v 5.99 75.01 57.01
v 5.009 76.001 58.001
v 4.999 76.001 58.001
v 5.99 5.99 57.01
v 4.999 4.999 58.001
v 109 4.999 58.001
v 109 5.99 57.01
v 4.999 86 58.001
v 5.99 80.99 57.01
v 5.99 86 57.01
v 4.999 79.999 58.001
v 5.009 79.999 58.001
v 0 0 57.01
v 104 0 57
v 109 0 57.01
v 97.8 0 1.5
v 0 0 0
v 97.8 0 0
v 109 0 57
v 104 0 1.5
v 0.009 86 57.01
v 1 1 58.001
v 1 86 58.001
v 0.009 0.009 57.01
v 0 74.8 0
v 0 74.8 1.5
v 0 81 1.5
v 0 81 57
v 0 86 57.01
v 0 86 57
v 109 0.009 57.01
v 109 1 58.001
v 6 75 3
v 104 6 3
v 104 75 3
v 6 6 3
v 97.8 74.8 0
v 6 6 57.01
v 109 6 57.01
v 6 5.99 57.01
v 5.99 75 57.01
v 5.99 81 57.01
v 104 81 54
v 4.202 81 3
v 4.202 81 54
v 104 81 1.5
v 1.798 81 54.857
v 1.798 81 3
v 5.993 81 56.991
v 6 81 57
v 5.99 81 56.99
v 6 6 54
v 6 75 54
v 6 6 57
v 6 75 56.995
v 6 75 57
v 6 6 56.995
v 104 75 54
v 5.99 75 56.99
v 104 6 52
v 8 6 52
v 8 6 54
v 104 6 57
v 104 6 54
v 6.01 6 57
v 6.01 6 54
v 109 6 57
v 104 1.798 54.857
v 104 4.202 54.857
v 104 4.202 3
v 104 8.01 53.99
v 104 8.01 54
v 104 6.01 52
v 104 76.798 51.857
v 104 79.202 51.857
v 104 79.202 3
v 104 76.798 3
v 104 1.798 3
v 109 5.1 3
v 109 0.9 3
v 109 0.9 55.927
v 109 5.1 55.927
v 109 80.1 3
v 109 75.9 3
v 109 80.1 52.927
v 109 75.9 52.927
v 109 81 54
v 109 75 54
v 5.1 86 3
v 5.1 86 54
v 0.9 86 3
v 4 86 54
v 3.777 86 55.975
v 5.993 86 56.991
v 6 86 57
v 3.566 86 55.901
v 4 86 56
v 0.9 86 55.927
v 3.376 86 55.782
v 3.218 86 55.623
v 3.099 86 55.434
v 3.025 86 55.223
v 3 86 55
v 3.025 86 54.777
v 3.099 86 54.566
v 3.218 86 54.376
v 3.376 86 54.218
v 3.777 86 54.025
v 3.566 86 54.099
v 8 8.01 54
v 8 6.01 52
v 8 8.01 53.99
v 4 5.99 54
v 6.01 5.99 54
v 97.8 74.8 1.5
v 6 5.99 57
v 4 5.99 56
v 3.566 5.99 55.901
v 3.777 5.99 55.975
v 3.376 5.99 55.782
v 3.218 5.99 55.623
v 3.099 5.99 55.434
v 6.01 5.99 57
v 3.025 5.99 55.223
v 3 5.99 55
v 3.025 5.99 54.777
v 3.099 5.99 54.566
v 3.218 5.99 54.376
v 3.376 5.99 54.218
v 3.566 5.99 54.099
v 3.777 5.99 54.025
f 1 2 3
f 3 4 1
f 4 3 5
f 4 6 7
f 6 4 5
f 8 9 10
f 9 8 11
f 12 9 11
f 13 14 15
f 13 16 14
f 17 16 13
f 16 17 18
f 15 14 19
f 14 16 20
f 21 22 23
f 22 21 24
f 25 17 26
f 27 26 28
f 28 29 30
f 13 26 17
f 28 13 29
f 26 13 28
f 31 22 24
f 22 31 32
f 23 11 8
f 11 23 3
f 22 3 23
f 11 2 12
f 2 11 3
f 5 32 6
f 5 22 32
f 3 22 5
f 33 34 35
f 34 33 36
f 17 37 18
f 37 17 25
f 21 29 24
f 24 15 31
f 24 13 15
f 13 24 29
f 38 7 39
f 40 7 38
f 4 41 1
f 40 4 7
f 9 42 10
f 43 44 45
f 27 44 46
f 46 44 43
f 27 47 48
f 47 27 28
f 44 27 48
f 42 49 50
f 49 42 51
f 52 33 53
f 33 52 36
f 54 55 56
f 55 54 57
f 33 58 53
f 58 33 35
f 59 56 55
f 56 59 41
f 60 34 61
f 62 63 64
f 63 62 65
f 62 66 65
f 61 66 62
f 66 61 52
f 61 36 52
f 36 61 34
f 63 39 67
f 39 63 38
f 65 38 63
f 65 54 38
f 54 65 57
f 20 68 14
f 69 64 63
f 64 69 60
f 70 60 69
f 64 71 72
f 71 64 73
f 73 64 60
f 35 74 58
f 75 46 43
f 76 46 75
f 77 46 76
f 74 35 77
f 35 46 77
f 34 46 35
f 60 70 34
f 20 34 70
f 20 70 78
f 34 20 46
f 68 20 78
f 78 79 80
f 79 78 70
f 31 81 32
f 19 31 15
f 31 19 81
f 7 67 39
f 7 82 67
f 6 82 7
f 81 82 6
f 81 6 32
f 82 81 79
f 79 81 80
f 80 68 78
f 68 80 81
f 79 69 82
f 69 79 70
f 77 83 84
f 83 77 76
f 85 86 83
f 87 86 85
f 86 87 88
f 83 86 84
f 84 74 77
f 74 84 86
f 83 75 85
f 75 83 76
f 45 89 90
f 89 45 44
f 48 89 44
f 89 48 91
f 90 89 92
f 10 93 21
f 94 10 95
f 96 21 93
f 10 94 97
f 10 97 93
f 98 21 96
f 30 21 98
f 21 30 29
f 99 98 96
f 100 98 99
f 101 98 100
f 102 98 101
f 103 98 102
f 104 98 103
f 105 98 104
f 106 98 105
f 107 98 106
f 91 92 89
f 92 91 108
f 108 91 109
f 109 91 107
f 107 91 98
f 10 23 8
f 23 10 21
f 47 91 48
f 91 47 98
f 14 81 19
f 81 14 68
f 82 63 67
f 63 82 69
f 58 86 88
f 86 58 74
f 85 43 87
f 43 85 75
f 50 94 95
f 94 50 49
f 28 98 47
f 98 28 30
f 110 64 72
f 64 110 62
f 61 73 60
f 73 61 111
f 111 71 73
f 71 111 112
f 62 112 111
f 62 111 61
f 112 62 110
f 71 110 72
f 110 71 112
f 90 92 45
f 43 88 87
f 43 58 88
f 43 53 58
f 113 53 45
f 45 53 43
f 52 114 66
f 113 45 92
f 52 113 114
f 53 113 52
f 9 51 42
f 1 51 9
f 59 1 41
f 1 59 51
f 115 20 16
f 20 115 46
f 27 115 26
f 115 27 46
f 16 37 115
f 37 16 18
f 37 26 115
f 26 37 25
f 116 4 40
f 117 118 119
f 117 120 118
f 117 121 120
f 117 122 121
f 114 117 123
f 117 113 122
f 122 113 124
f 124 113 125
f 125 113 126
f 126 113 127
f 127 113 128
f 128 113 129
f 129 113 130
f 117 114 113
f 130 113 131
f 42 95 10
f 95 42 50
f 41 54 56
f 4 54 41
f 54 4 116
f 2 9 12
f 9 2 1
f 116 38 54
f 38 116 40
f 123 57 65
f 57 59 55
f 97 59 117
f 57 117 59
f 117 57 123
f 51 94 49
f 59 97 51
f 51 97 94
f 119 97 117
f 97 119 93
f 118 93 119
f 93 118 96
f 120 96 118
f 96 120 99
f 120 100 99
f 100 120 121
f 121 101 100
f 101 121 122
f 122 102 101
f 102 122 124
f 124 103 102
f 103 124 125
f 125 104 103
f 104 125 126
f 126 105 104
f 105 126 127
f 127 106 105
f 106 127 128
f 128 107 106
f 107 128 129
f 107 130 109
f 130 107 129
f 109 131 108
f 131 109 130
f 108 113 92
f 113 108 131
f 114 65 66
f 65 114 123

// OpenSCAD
// ============================================================================
// cutlery_box.scad
// Graduated 3-chamber disposable-cutlery box (Option 3) — CUT-FROM-SOLID port
// of build_box.py, for a 120 x 120 x 120 mm printer (AOSEED).
//
// WHY THIS PORT EXISTS (the whole point):
//   The hand-mesh generator (build_box.py) could not keep the 1 mm rim chamfer
//   continuous across the female dovetail joints, because where a slot's flared
//   corner crosses the sloped chamfer it needs a true boolean intersection.
//   OpenSCAD HAS that boolean kernel, so here we do exactly the "cut-from-solid"
//   thing:
//      1. Build the ENTIRE box as ONE solid, WITH the chamfer already on it.
//      2. difference() out vertical dovetail prisms ( /_\ cross-section ),
//         running from just above the base plate up THROUGH the rim, to both
//         (a) form the sliding-dovetail joints, and
//         (b) split the box into 6 bed-sized pieces.
//   Because the cut is a real boolean through the already-chamfered solid, the
//   sloped chamfer<->slot edge is produced for free => the rim chamfer stays
//   CONTINUOUS across every joint, with none of the sliver hacks.
//
// ----------------------------------------------------------------------------
// HOW TO USE
//   In the app:  set `part` below (or use the Customizer dropdown), F5 to
//                preview, F6 to render, then File > Export > STL.
//   One piece (CLI):
//      openscad -o body_knife_A.stl -D 'part="knife_A"' cutlery_box.scad
//   ALL SIX (bash, run from this folder):
//      for p in knife_A knife_B fork_A fork_B spoon_A spoon_B; do \
//        openscad -o "body_$p.stl" -D "part=\"$p\"" cutlery_box.scad ; done
//   PNG preview of one piece:
//      openscad -o knife_B.png --imgsize=1400,1000 --autocenter --viewall \
//        -D 'part="knife_B"' cutlery_box.scad
//
//   Pieces are modelled in ASSEMBLED coordinates (floor-down, z=0 is the bed),
//   so importing all six STLs together shows the assembled box directly; your
//   slicer will auto-drop each one onto the plate for printing.
//
// BED SANITY: every piece is <= 120 mm in X, Y, Z.
//   Z = 58 mm. Widest piece = spoon at 117 mm (Y). A-halves reach 109 mm (X,
//   including the protruding dovetail key). All under 120.
//
// !! I could NOT run OpenSCAD to verify this file (no binary in my sandbox) !!
//   - The rim chamfer is a SMOOTH, true-45 bevel built from hull() frustums of
//     convex rectangles. Works in every OpenSCAD since ~2015 (incl. Homebrew
//     2021.01). No stepped staircase -- and, crucially, it makes box() a clean
//     well-formed solid so the per-part booleans resolve reliably (the old
//     14-slice staircase was fragile and CGAL was dropping the walls of the
//     interior parts, leaving only the key prisms => "floating boxes").
//   - roof() is still available behind USE_ROOF=true for those who have it
//     (2021.01+ snapshots); for THIS rectangular design it is identical, so it
//     is NOT required.
//   - After F6, check the console for "WARNING"/"not a valid 2-manifold".
//     If a tenon ever looks detached, bump EPS to 0.05.
// ============================================================================


/* [Part to render / export] */
part = "knife_A"; // [knife_A, knife_B, fork_A, fork_B, spoon_A, spoon_B, assembly]

/* [Chamfer method] */
// false = smooth hull() frustum bevel (default, any OpenSCAD); true = roof() (2021.01+)
USE_ROOF = false;

/* [Heights (mm)] */
BASE   = 3.0;     // floor / base-plate thickness
COMP_H = 55.0;    // interior wall height above the floor (cutlery stack depth)

/* [Walls (mm)] */
HOST_T   = 6.0;     // thickness of every wall (thick enough to host a dovetail)
HALF_LEN = 104.0;   // printed length of each half (A = near, B = far); <120 incl. key

/* [Chamber bays (mm)] */
N_COL     = 3;       // columns of cutlery per chamber
KNIFE_COL = 23.0;    // -> knife bay 69  (3 x 19 mm knives + play)
FORK_COL  = 33.0;    // -> fork  bay 99  (3 x 29 mm forks  + play)
SPOON_COL = 37.0;    // -> spoon bay 111 (3 x 34 mm spoons + play, trimmed <120)

/* [Dovetail joint (mm)] */
DT_DEPTH = 5.0;   // tail protrusion past the seam (male key depth)
DT_NECK  = 1.2;   // half-width at the seam face (narrow)
DT_FLARE = 2.1;   // half-width at the tip (wide -> locks)
DT_CLR   = 0.4;   // FLANK/seam slide clearance added to the female socket (do not change for fit)
DT_DEPTH_RELIEF = 0.3; // extra depth on the socket BACK only, so the tail tip never bottoms out

/* [Hidden-dovetail top cap / "hat" (mm)] */
// The dovetail otherwise shows its trapezoid outline on the TOP edge of the wall.
// To hide it, the MALE piece extends the wall's full-width top (chamfer included)
// across the key footprint -> a flush, continuous top. The FEMALE piece gets a
// matching top RECESS (cap footprint + CAP_CLR) so the cap drops straight in.
// Result: the top reads as one surface with a single straight seam line at the cap
// tip; the dovetail joinery lives entirely below the cap.
//
// SELF-SUPPORTING UNDERSIDE: the cap reaches the FULL wall width at the chamfer base
// (so the top edge reads as the wall extended, with NO recessed sliver on the outer
// face), and its underside is ONE planar ramp from the chamfer's OUTER CORNER
// (half-width HOST_T/2 at z = BODY_H-CHAMFER) down to the dovetail-neck half-width
// (CAP_FOOT) at CAP_SLANT_DEG from horizontal. No little horizontal step. The ramp
// reaching full width exactly at the chamfer base means "ramp top" == "chamfer base"
// (CAP_H is DERIVED). The FEMALE recess is the same ramp + CAP_CLR play.
// TRADEOFF: because the cap runs all the way to the outer corner, the female wall
// tapers to ~0 at z = BODY_H-CHAMFER -> a thin feather edge at the joint (gradual at
// CAP_SLANT_DEG, hidden inside the joint when assembled). Accepted per design intent.
CAP_SLANT_DEG = 50;     // cap underside ramp angle from horizontal (50 = self-supporting, long flare)
CAP_FOOT = DT_NECK;     // cap-underside half-width where it meets the dovetail neck
CAP_CLR = 0.3;          // slide clearance so the male cap seats into the female top recess

/* [Rim chamfer (mm)] */
CHAMFER = 1.0;    // 45-deg comfort break broken along the top wall edges

/* [Base half-lap / anti-warp (mm)] */
// Neighbouring base plates overlap as a HORIZONTAL half-lap (shiplap) at mid-base
// height, so corners stay coplanar (no lift/protrusion). Horizontal lap faces do
// NOT bind the vertical-drop assembly. Shingle direction: A->B and knife->fork->spoon.
LAP_LEN = 6;        // overlap past the A/B seam and the knife/fork seam
LAP_LEN_FS = 2;     // overlap past the fork/SPOON seam -- SMALLER: spoon is the
                    // tightest piece (117mm of the 120mm bed); a 6mm lap there
                    // would push spoon to 123mm. 2mm keeps spoon at 119mm.
LAP_Z   = BASE/2;   // 1.5 -- horizontal split height of the lap (bottom vs top half)
LAP_CLR = 0.2;      // in-plane clearance so the shelf isn't a press fit

/* [Lid — box features that receive a flat ORDERED clear sheet] */
// The lid itself is NOT printed: it's a flat ~2 mm PETG/Tritan sheet, bullnose-polished
// edges (r=LID_EDGE_R), ordered to size. We only model the box features that receive it.
LID_T            = 2.0;   // ordered sheet thickness
LID_EDGE_R       = 1.0;   // ordered sheet bullnose edge radius (for the sheet order spec)
LID_PLAY         = 0.4;   // total vertical play in the hinge groove (sheet + this)
LID_RECESS       = 2.0;   // lid TOP sits this far BELOW the rim, so the journal pocket is fully
                          // capped (rim caps the bullnose -> retains the lid when raised; tilt-in)
HINGE_AT_MINUS_X = true;  // hinge on the -x (303mm) end wall; clip on +x. (flip = mirror; default delivered)
// perimeter support ledge (lid underside rests on it at z = BODY_H-LID_T)
LEDGE_W          = 2.0;   // ledge inward protrusion (its underside ramps back at 45 deg -> self-supporting)
GROOVE_END_INSET = 0.0;   // groove reaches the corners but RUNS OUT smoothly there (no end-face / no
                          // exposed bore); GROOVE_TAPER sets the run-out length
GROOVE_TAPER     = 4.0;   // y-length over which the eased mouth tapers out at each groove end
// hinge journal (cut into the inner face of the hinge end wall, CONTINUOUS along the long edge)
GROOVE_DEPTH     = 3.0;   // 2mm lead-in slot + 1mm pocket radius -> journal sits 2mm back from the
                          // face so its cap clears the swing relief and RETAINS the lid
GROOVE_POCKET_R  = 1.0;   // journal half-cylinder radius (the bullnose sheet edge rolls in it)
// clip latch (one localized retainer, centered on the clip end wall)
CLIP_W           = 18.0;  // clip width
CLIP_LIP         = 0.4;   // retaining overhang (0.3 light .. 0.6 firm)
CLIP_RAMP_H      = 1.6;   // cam-ramp height above the rim (press-to-close)
// finger scallop (semicircular dish in the rim, centered on & aligned with the clip)
SCALLOP_W        = 16.0;  // scallop width
SCALLOP_DEPTH    = 6.0;   // how far it dishes down from the rim


/* [Hidden] */
EPS      = 0.01;          // tiny overlap so abutting solids fuse cleanly in CGAL
// Upper-chamber pieces (fork, spoon) were cut by a cell plane laid EXACTLY on the
// divider wall's far face (the lower chamber owns that wall). intersection() along a
// plane coincident with an existing box face makes CGAL leave a ZERO-THICKNESS copy
// of the wall face -> edge-manifold + "watertight" but degenerate (OpenSCAD shows it
// as a blue back-face; Tinkercad thickens it into a phantom block). SEAM_EPS nudges
// those cut planes a hair INTO the open bay so they no longer coincide with any box
// face -> no flap. 0.02 mm is physically nothing but is well clear of CGAL's tolerance.
SEAM_EPS = 0.02;
CUT_OVER = 1.0;           // how far dovetail cutters overshoot the rim (clean cut)

BODY_H    = BASE + COMP_H;     // 58  total height
END_WALL  = HOST_T;            // end walls are dovetail hosts too -> equally thick
TOTAL_LEN = 2 * HALF_LEN;      // 208 assembled length (end wall .. end wall)

// hidden-cap ramp geometry (derived).
//   CAP_HW    = cap MAX half-width = HOST_T/2 (the full wall edge) at the chamfer base.
//   CAP_RISE  = vertical height of the self-supporting CAP_SLANT_DEG underside ramp.
//   CAP_ZRAMP = where the cap reaches full width = the chamfer base (BODY_H-CHAMFER), so
//               the ramp runs straight to the chamfer OUTER CORNER (no horizontal step).
//   CAP_ZBOT  = cap bottom = ramp start; CAP_H derived from it (for reference/report).
//   CAP_ZRAMP_R = recess ramp top, shifted down by CAP_CLR so the recess ramp stays
//               parallel to the cap ramp with uniform play.
CAP_HW      = HOST_T/2;   // cap reaches the FULL wall edge at the chamfer base
CAP_RISE    = (CAP_HW - CAP_FOOT) * tan(CAP_SLANT_DEG);
CAP_ZRAMP   = BODY_H - CHAMFER;               // full width exactly at the chamfer base / outer corner
CAP_ZBOT    = CAP_ZRAMP - CAP_RISE;
CAP_H       = BODY_H - CAP_ZBOT;              // derived; reported
CAP_ZRAMP_R = CAP_ZRAMP;   // recess ramp ALSO tops at the chamfer corner (mirror the cap) -> no vertical lip
// sanity checks
assert(CAP_ZBOT > BASE + 1,
       "cap zone dips too low -- raise CAP_SLANT_DEG");
assert(CAP_HW >= DT_FLARE,
       "cap too narrow to cover the dovetail tail");

// NOTE: lid-derived constants are defined BELOW the Y-layout block, because some of
// them (INTERIOR_Y0/Y1, CLIP_CY) depend on OUTER_L / OUTER_R / EXT_W. See "lid derived".

// bay widths
KNIFE_BAY = N_COL * KNIFE_COL; // 69
FORK_BAY  = N_COL * FORK_COL;  // 99
SPOON_BAY = N_COL * SPOON_COL; // 111

// ---- Y layout (width direction): wall | bay | divider | bay | divider | bay | wall
KNIFE_Y0 = 0;
KNIFE_Y1 = HOST_T + KNIFE_BAY + HOST_T;        // 0..81   (outer wall + bay + divider)
FORK_Y0  = KNIFE_Y1;                           // 81
FORK_Y1  = FORK_Y0 + FORK_BAY + HOST_T;        // 81..186 (bay + divider)
SPOON_Y0 = FORK_Y1;                            // 186
SPOON_Y1 = SPOON_Y0 + SPOON_BAY + HOST_T;      // 186..303(bay + outer wall)
EXT_W    = SPOON_Y1;                           // 303 total width

// lengthwise wall Y-bands [y0,y1] (host the A/B dovetails) + their centers
OUTER_L  = [0, HOST_T];                                       // [0,6]    c=3
DIV_KF   = [HOST_T + KNIFE_BAY, HOST_T + KNIFE_BAY + HOST_T]; // [75,81]  c=78
DIV_FS   = [FORK_Y0 + FORK_BAY, FORK_Y0 + FORK_BAY + HOST_T]; // [180,186]c=183
OUTER_R  = [SPOON_Y1 - HOST_T, SPOON_Y1];                     // [297,303]c=300

// ---- lid derived ---- (placed AFTER OUTER_L/OUTER_R/EXT_W so nothing is forward-referenced)
LID_TOP_Z   = BODY_H - LID_RECESS;        // 56  lid TOP (recessed); rim z=58 rises LID_RECESS above it
LID_Z_UNDER = LID_TOP_Z - LID_T;          // 54  lid underside / ledge top / lowered-divider top
POCKET_CZ   = LID_TOP_Z - LID_T/2;        // 55  journal centre (lid mid) -> pocket top = LID_TOP_Z = capped
// hinge end-wall inner face x + inward direction; clip end-wall inner face x + inward dir
HINGE_INX   = HINGE_AT_MINUS_X ? END_WALL : TOTAL_LEN - END_WALL;       // 6  (default)
HINGE_IN    = HINGE_AT_MINUS_X ? 1 : -1;  // interior direction from the hinge wall (+x default)
CLIP_INX    = HINGE_AT_MINUS_X ? TOTAL_LEN - END_WALL : END_WALL;       // 202 (default)
CLIP_IN     = HINGE_AT_MINUS_X ? -1 : 1;  // interior direction from the clip wall (-x default)
POCKET_CX   = HINGE_INX - HINGE_IN*(GROOVE_DEPTH - GROOVE_POCKET_R);    // 5  pocket centre x (INTO the wall)
INTERIOR_Y0 = OUTER_L[1];                 // 6   inner face of the -y short wall
INTERIOR_Y1 = OUTER_R[0];                 // 297 inner face of the +y short wall
CLIP_CY     = EXT_W/2;                     // 151.5 clip/scallop centre (in the fork chamber)
assert(POCKET_CZ - GROOVE_POCKET_R > BASE + 1,
       "journal dips too low -- reduce LID_RECESS or LID_T");
assert(POCKET_CZ + GROOVE_POCKET_R <= LID_TOP_Z + EPS,
       "journal not capped -- lower the lid (raise LID_RECESS) or shrink GROOVE_POCKET_R");
// NOTE: with LID_RECESS the lid underside (and lowered dividers) sit BELOW CAP_ZBOT. That is
// intended: the inner dividers are cut flat below the cap zone (their hidden caps are removed,
// but the lid covers them); the perimeter/end-wall caps are untouched (full-height walls).

// the three OPEN bays are rectangular holes in the wall footprint:
//   footprint = outer rectangle MINUS these bays  (== the 6 walls; verified).
// The smooth chamfer is built from exactly this decomposition.
BAY_X0 = END_WALL;              // 6
BAY_X1 = TOTAL_LEN - END_WALL;  // 202
BAYS = [
    [BAY_X0, BAY_X1, HOST_T,   HOST_T + KNIFE_BAY],   // knife bay [6,202] x [6,75]
    [BAY_X0, BAY_X1, FORK_Y0,  FORK_Y0 + FORK_BAY],   // fork  bay [6,202] x [81,180]
    [BAY_X0, BAY_X1, SPOON_Y0, SPOON_Y0 + SPOON_BAY], // spoon bay [6,202] x [186,297]
];

YC_OUTL  = OUTER_L[0] + HOST_T/2;   // 3   outer-left wall center
YC_DIVKF = DIV_KF[0]  + HOST_T/2;   // 78  knife/fork divider center
YC_DIVFS = DIV_FS[0]  + HOST_T/2;   // 183 fork/spoon divider center
YC_OUTR  = OUTER_R[0] + HOST_T/2;   // 300 outer-right wall center

// seams
AB_SEAM = HALF_LEN;               // 104  A/B length seam (x)
SEAM_KF = FORK_Y0;                // 81   knife/fork width seam (y)
SEAM_FS = SPOON_Y0;              // 186  fork/spoon width seam (y)
ENDC_A  = END_WALL/2;             // 3    A end-wall center (x) -> chamber dovetails
ENDC_B  = TOTAL_LEN - END_WALL/2; // 205  B end-wall center (x)


// ============================================================================
// 2D wall footprint (cross-section of all walls, constant in z for the straight
// part). Union of: 2 full-width end walls + 4 lengthwise walls between them.
// ============================================================================
module wall_footprint_2d() {
    // footprint = outer rectangle minus the 3 open bays  (== the 6 walls)
    difference() {
        square([TOTAL_LEN, EXT_W]);
        for (b = BAYS) translate([b[0], b[2]]) square([b[1] - b[0], b[3] - b[2]]);
    }
}

// ============================================================================
// The full chamfered box solid = base plate + walls with a continuous 1 mm
// top-rim chamfer. Built ONCE; every piece is carved out of this.
// ============================================================================
module chamfer_cap() {
    // SMOOTH 45 rim chamfer over z[BODY_H-CHAMFER, BODY_H], in absolute coords.
    zm = BODY_H - CHAMFER;
    if (USE_ROOF) {
        // exact straight-skeleton roof, capped at CHAMFER height (needs roof()).
        intersection() {
            translate([0,0,zm]) roof() wall_footprint_2d();
            translate([0,0,zm]) linear_extrude(CHAMFER + EPS) wall_footprint_2d();
        }
    } else {
        // DEFAULT: true 45 bevel as hull() frustums of CONVEX rectangles -> smooth
        // AND a clean manifold.  Since footprint = outer - bays, the chamfer of the
        // footprint = (outer rectangle beveled inward) MINUS (each bay beveled so it
        // grows toward the top, which bevels every bay-facing rim).  All hull()s are
        // on convex rectangles, so nothing gets convex-filled.
        difference() {
            // outer perimeter frustum: full outer rect at zm -> inset by CHAMFER at top
            hull() {
                translate([0,0,zm])     linear_extrude(0.001) square([TOTAL_LEN, EXT_W]);
                translate([0,0,BODY_H]) linear_extrude(0.001) offset(delta=-CHAMFER) square([TOTAL_LEN, EXT_W]);
            }
            // each bay grows by CHAMFER toward the top -> bevels its surrounding rim.
            // (overshoots z a hair past both ends so the cut is clean.)
            for (b = BAYS)
                hull() {
                    translate([0,0,zm-EPS])     linear_extrude(0.001)
                        translate([b[0],b[2]]) offset(delta=-EPS)        square([b[1]-b[0], b[3]-b[2]]);
                    translate([0,0,BODY_H+EPS]) linear_extrude(0.001)
                        translate([b[0],b[2]]) offset(delta=CHAMFER+EPS) square([b[1]-b[0], b[3]-b[2]]);
                }
        }
    }
}

module box() {
    zm = BODY_H - CHAMFER;
    union() {
        cube([TOTAL_LEN, EXT_W, BASE]);                                        // base plate z[0,3]
        translate([0,0,BASE]) linear_extrude(zm - BASE + EPS) wall_footprint_2d(); // straight walls z[3,57]
        chamfer_cap();                                                         // smooth chamfer z[57,58]
    }
}

// ============================================================================
// Dovetail prisms ( /_\ ). Vertical, z[BASE, BODY_H+CUT_OVER] so they cut
// through the rim but leave the base plate continuous. The near face is pushed
// back EPS so a male key always fuses to its wall.
//   male key   : half_n=DT_NECK,         half_f=DT_FLARE
//   female slot: half_n=DT_NECK+DT_CLR,  half_f=DT_FLARE+DT_CLR
// ============================================================================
module dt_prism_X(seam_x, yc, half_n, half_f) {   // perpendicular to X, grows +X
    translate([0,0,BASE]) linear_extrude(BODY_H - BASE + CUT_OVER)
        polygon([[seam_x - EPS,        yc - half_n],
                 [seam_x + DT_DEPTH,   yc - half_f],
                 [seam_x + DT_DEPTH,   yc + half_f],
                 [seam_x - EPS,        yc + half_n]]);
}
module dt_prism_Y(seam_y, xc, half_n, half_f) {   // perpendicular to Y, grows +Y
    translate([0,0,BASE]) linear_extrude(BODY_H - BASE + CUT_OVER)
        polygon([[xc - half_n, seam_y - EPS],
                 [xc - half_f, seam_y + DT_DEPTH],
                 [xc + half_f, seam_y + DT_DEPTH],
                 [xc + half_n, seam_y - EPS]]);
}
module ab_key   (yc)        { dt_prism_X(AB_SEAM, yc, DT_NECK, DT_FLARE); }
module ch_key   (seam_y, xc){ dt_prism_Y(seam_y, xc, DT_NECK, DT_FLARE); }

// Female sockets = male + DT_CLR on the flanks/seam (unchanged), PLUS a straight
// back-face relief of DT_DEPTH_RELIEF so the tail tip never bottoms out. The
// relief is a rectangle tacked onto the trapezoid's tip at the SAME flare width,
// so the angled flank faces (and their 0.4 mm slide clearance) are untouched.
module ab_socket(yc) {
    dt_prism_X(AB_SEAM, yc, DT_NECK + DT_CLR, DT_FLARE + DT_CLR);
    translate([0,0,BASE]) linear_extrude(BODY_H - BASE + CUT_OVER)
        translate([AB_SEAM + DT_DEPTH, yc - (DT_FLARE + DT_CLR)])
            square([DT_DEPTH_RELIEF, 2*(DT_FLARE + DT_CLR)]);          // back relief, +X
}
module ch_socket(seam_y, xc) {
    dt_prism_Y(seam_y, xc, DT_NECK + DT_CLR, DT_FLARE + DT_CLR);
    translate([0,0,BASE]) linear_extrude(BODY_H - BASE + CUT_OVER)
        translate([xc - (DT_FLARE + DT_CLR), seam_y + DT_DEPTH])
            square([2*(DT_FLARE + DT_CLR), DT_DEPTH_RELIEF]);          // back relief, +Y
}

// ===== hidden-dovetail top cap ("hat"), SELF-SUPPORTING underside ===============
// MALE cap: a FULL-wall-width hat whose underside is ONE planar ramp from the chamfer's
// OUTER CORNER (half-width CAP_HW = HOST_T/2 at CAP_ZRAMP = BODY_H-CHAMFER) down to the
// dovetail-neck half-width (CAP_FOOT) at CAP_SLANT_DEG from horizontal -> the self-
// supporting shoulder, running straight to the corner (no horizontal step). Built as
// hull(narrow bottom slab buried in the tail neck, full-width top slab through the rim);
// box() trims it to the wall and adds the continuous rim chamfer for free, so the outer
// top edge reads as the wall extended (no recessed sliver). The protruding NOSE is left
// SQUARE (vertical) -- hidden in the female socket when assembled.
// TRADEOFF: the female wall tapers to ~0 at z=BODY_H-CHAMFER (a thin feather edge at the
// joint, gradual at CAP_SLANT_DEG) -- accepted per design intent.
module ab_cap(yc) {   // A/B seam, grows +X past the seam (length direction)
    hull() {
        translate([AB_SEAM - EPS, yc - CAP_FOOT, CAP_ZBOT])
            cube([DT_DEPTH + EPS, 2*CAP_FOOT, EPS]);
        translate([AB_SEAM - EPS, yc - CAP_HW,   CAP_ZRAMP])
            cube([DT_DEPTH + EPS, 2*CAP_HW, (BODY_H + CUT_OVER) - CAP_ZRAMP]);
    }
}
module ch_cap(seam_y, xc) {   // chamber seam, grows +Y past the seam (in the end wall)
    hull() {
        translate([xc - CAP_FOOT, seam_y - EPS, CAP_ZBOT])
            cube([2*CAP_FOOT, DT_DEPTH + EPS, EPS]);
        translate([xc - CAP_HW,   seam_y - EPS, CAP_ZRAMP])
            cube([2*CAP_HW, DT_DEPTH + EPS, (BODY_H + CUT_OVER) - CAP_ZRAMP]);
    }
}
// FEMALE recess: the SAME ramp grown by CAP_CLR (flanks, tip, floor, and ramp shifted down
// by CAP_CLR so it stays parallel) -> the cap seats with uniform slide clearance. It opens
// to the wall edge (and a hair past, into air) so the cap's full-width corner drops in;
// this is what leaves the thin female feather at the top (accepted). Open upward + toward seam.
module ab_cap_neg(yc) {
    hull() {
        translate([AB_SEAM - EPS, yc - (CAP_FOOT + CAP_CLR), CAP_ZBOT - CAP_CLR])
            cube([DT_DEPTH + CAP_CLR + EPS, 2*(CAP_FOOT + CAP_CLR), EPS]);
        translate([AB_SEAM - EPS, yc - (CAP_HW + EPS), CAP_ZRAMP_R])
            cube([DT_DEPTH + CAP_CLR + EPS, 2*(CAP_HW + EPS), (BODY_H + CUT_OVER + 1) - CAP_ZRAMP_R]);
    }
}
module ch_cap_neg(seam_y, xc) {
    hull() {
        translate([xc - (CAP_FOOT + CAP_CLR), seam_y - EPS, CAP_ZBOT - CAP_CLR])
            cube([2*(CAP_FOOT + CAP_CLR), DT_DEPTH + CAP_CLR + EPS, EPS]);
        translate([xc - (CAP_HW + EPS), seam_y - EPS, CAP_ZRAMP_R])
            cube([2*(CAP_HW + EPS), DT_DEPTH + CAP_CLR + EPS, (BODY_H + CUT_OVER + 1) - CAP_ZRAMP_R]);
    }
}
// LOWERED-DIVIDER hat: same 50-deg self-supporting cap as ab_cap, but reaching FULL width at the
// LOWERED divider top (LID_Z_UNDER) instead of the rim -- because the inner dividers are lowered
// for the lid, which strips their normal cap. It extends above the top and is trimmed flush to
// LID_Z_UNDER by divider_lower(), so the divider top reads as one surface (dovetail hidden below).
DCAP_ZRAMP = LID_Z_UNDER;            // full width at the lowered divider top (54)
DCAP_ZBOT  = DCAP_ZRAMP - CAP_RISE;  // ramp start (neck), 50 deg below
module div_cap(yc) {        // male hat on the lowered divider (A/B seam)
    hull() {
        translate([AB_SEAM - EPS, yc - CAP_FOOT, DCAP_ZBOT])
            cube([DT_DEPTH + EPS, 2*CAP_FOOT, EPS]);
        translate([AB_SEAM - EPS, yc - CAP_HW,   DCAP_ZRAMP])
            cube([DT_DEPTH + EPS, 2*CAP_HW, (BODY_H + CUT_OVER) - DCAP_ZRAMP]);
    }
}
module div_cap_neg(yc) {    // female recess to receive div_cap (with CAP_CLR slide play)
    hull() {
        translate([AB_SEAM - EPS, yc - (CAP_FOOT + CAP_CLR), DCAP_ZBOT - CAP_CLR])
            cube([DT_DEPTH + CAP_CLR + EPS, 2*(CAP_FOOT + CAP_CLR), EPS]);
        translate([AB_SEAM - EPS, yc - (CAP_HW + EPS), DCAP_ZRAMP])
            cube([DT_DEPTH + CAP_CLR + EPS, 2*(CAP_HW + EPS), (BODY_H + CUT_OVER + 1) - DCAP_ZRAMP]);
    }
}

// rectangular cell (x[xa,xb], y[ya,yb], full height + margin) used to split pieces
module cell(xa, xb, ya, yb) {
    translate([xa, ya, -1]) cube([xb - xa, yb - ya, BODY_H + 11]);
}

// ===== base half-lap (shiplap) =================================================
// HORIZONTAL lap at mid-base height: the shelf-owner keeps its BOTTOM half
// (z 0..LAP_Z) extending LAP_LEN past the seam; the neighbour has its bottom half
// REMOVED there (keeps only the top half) and lands flat on the shelf. Horizontal
// faces => no binding during the vertical drop. Shelves live entirely in the base
// (z < BASE), well clear of the wall dovetails (z >= BASE).
// Shingle = FEMALE-first (matches the no-notch dovetail assembly order, which
// lowers the male piece onto the female): the B half owns the A/B shelf (grows
// -X into A) and the UPPER chamber (fork, spoon) owns the chamber shelf (grows
// -Y into the lower chamber).  Order: spoon, fork, knife; B before A.
module lap_shelf_X(y0, y1) {                 // B-side shelf, grows -X into A past AB_SEAM
    // +EPS past AB_SEAM so the shelf interpenetrates (not just abuts) its own B body -> fuses cleanly.
    translate([AB_SEAM - LAP_LEN, y0, 0]) cube([LAP_LEN + EPS, y1 - y0, LAP_Z]);
}
module lap_neg_X(y0, y1) {                   // A-side: remove bottom half to receive it
    translate([AB_SEAM - LAP_LEN - LAP_CLR, y0 - EPS, -EPS])
        cube([LAP_LEN + LAP_CLR + EPS, (y1 - y0) + 2*EPS, LAP_Z + EPS]);
}
module lap_shelf_Y(seam_y, x0, x1, ln=LAP_LEN) {   // upper-chamber shelf, grows -Y into lower
    // grows -Y by `ln` into the lower chamber AND +Y by 2*SEAM_EPS past the seam so it
    // always overlaps the (SEAM_EPS-nudged) body floor and stays fused -> no floating shelf.
    translate([x0, seam_y - ln, 0]) cube([x1 - x0, ln + 2*SEAM_EPS, LAP_Z]);
}
module lap_neg_Y(seam_y, x0, x1, ln=LAP_LEN) {     // lower-chamber: remove bottom half
    translate([x0 - EPS, seam_y - ln - LAP_CLR, -EPS])
        cube([(x1 - x0) + 2*EPS, ln + LAP_CLR + EPS, LAP_Z + EPS]);
}

// ============================================================================
// LID FEATURES (receive a flat ORDERED clear sheet; the sheet is not printed).
// All features live at the TOP (z >= ~52), ABOVE the dovetail engagement, the half-lap
// (z<1.5) and most of the hat, so the vertical-drop assembly and joints are untouched.
// EPS overlaps throughout; no coincident coplanar faces with the existing walls.
// Default orientation: HINGE on the -x end wall (A pieces), CLIP on the +x end wall
// (B pieces), clip+scallop centred on the fork (middle) chamber.
// ============================================================================

// --- perimeter support ledge: 45-deg self-supporting brackets; rest face at LID_Z_UNDER.
//     Runs along the CLIP end wall + the two short outer walls. (Hinge wall uses the groove.)
//     Built as hull(thin top edge, wall column) -> a triangular bracket whose underside is
//     a 45-deg ramp (prints floor-down with no support). ADDED to each piece (clipped by cell).
//     Each run is INSET by LEDGE_W from the perpendicular walls so the three brackets never
//     overlap at a corner and the wall's normal chamfer wraps every corner uninterrupted.
module lid_ledge() {
    cy0 = INTERIOR_Y0 + LEDGE_W;  cy1 = INTERIOR_Y1 - LEDGE_W;  cyl = cy1 - cy0;   // clip-run y span (inset)
    sx0 = END_WALL    + LEDGE_W;  sxl = (TOTAL_LEN - 2*END_WALL) - 2*LEDGE_W;       // short-run x span (inset)
    // clip end wall (x = CLIP_INX), bracket protrudes toward interior (CLIP_IN)
    hull() {
        translate([CLIP_INX + CLIP_IN*LEDGE_W, cy0, LID_Z_UNDER - EPS]) cube([EPS, cyl, EPS]);
        translate([CLIP_INX - EPS,             cy0, LID_Z_UNDER - LEDGE_W]) cube([2*EPS, cyl, LEDGE_W]);
    }
    // OUTER_L short wall (y = INTERIOR_Y0), bracket protrudes +y
    hull() {
        translate([sx0, INTERIOR_Y0 + LEDGE_W, LID_Z_UNDER - EPS]) cube([sxl, EPS, EPS]);
        translate([sx0, INTERIOR_Y0 - EPS,     LID_Z_UNDER - LEDGE_W]) cube([sxl, 2*EPS, LEDGE_W]);
    }
    // OUTER_R short wall (y = INTERIOR_Y1), bracket protrudes -y
    hull() {
        translate([sx0, INTERIOR_Y1 - LEDGE_W, LID_Z_UNDER - EPS]) cube([sxl, EPS, EPS]);
        translate([sx0, INTERIOR_Y1 - EPS,     LID_Z_UNDER - LEDGE_W]) cube([sxl, 2*EPS, LEDGE_W]);
    }
}

// --- hinge groove: ONE 2D cross-section (journal bore + lead-in slot + 45-deg swing ramp),
//     CAPPED at the recessed lid top (LID_TOP_Z), swept along the wall. At BOTH ends the whole
//     profile RUNS OUT smoothly -- it tapers to the inner-top rim corner (HINGE_INX, BODY_H) --
//     so there is NO end-face and NO exposed bore at the corners; the groove just fades into the
//     wall. The rim caps the bullnose (retains the lid, tilt-in); the 45-deg ramp is self-
//     supporting and gives the swing clearance; the cap stays full over the bullnose => retains.
module groove_profile() {                            // 2D cross-section in (x, z)
    union() {
        translate([POCKET_CX, POCKET_CZ]) circle(r = GROOVE_POCKET_R, $fn = 28);              // journal bore
        translate([POCKET_CX, LID_Z_UNDER]) square([HINGE_INX - POCKET_CX + EPS, LID_T]);     // lead-in slot
        polygon([[POCKET_CX, LID_TOP_Z], [HINGE_INX + EPS, LID_TOP_Z], [HINGE_INX + EPS, BODY_H - CHAMFER]]); // swing relief (below the rim chamfer)
        polygon([[HINGE_INX, BODY_H - CHAMFER], [HINGE_INX + EPS, BODY_H + EPS], [HINGE_INX - CHAMFER, BODY_H + EPS]]); // rim chamfer cut, CONTINUOUS through the divider junctions (no bulge)
    }
}
module groove_extrude(y0, y1) {                      // sweep the profile along the wall, y0..y1
    translate([0, y0, 0]) rotate([90,0,0]) translate([0,0,-(y1 - y0)]) linear_extrude(y1 - y0) groove_profile();
}
module hinge_groove() {
    // journal runs STRAIGHT to the end of the wall at each side; the perpendicular short wall
    // caps the bore there (no run-out). The EPS overlap tucks the bore end into the short wall.
    groove_extrude(INTERIOR_Y0 - EPS, INTERIOR_Y1 + EPS);
}

// --- lower the inner chamber dividers to the lid underside (mid-support, no sag).
//     Removes the divider top over the full length; outer walls keep full height.
module divider_lower() {
    // x-span is the CHAMBER BAY only [BAY_X0, BAY_X1] (+EPS overlap into the end walls so the
    // cut is manifold). The end/outer walls keep their full BODY_H tops; only the two INNER
    // dividers (DIV_KF, DIV_FS) are lowered.
    translate([BAY_X0 - EPS, DIV_KF[0], LID_Z_UNDER]) cube([BAY_X1 - BAY_X0 + 2*EPS, HOST_T, BODY_H - LID_Z_UNDER + CUT_OVER]);
    translate([BAY_X0 - EPS, DIV_FS[0], LID_Z_UNDER]) cube([BAY_X1 - BAY_X0 + 2*EPS, HOST_T, BODY_H - LID_Z_UNDER + CUT_OVER]);
}

// --- retaining clip (ADDED): a lip on the clip end wall, centred on CLIP_CY, that overhangs
//     the RECESSED lid top (LID_TOP_Z) by CLIP_LIP and holds it down. A lead-in ramp above the
//     lip (up to LID_TOP_Z+CLIP_RAMP_H, still below the rim) cams the lid under as it swings
//     closed. Anchored into the wall (x = CLIP_INX-CLIP_IN*HOST_T/2). Added AFTER the scallop
//     cut so the scallop never undercuts it. No longer protrudes above the rim.
module lid_clip() {
    translate([0, CLIP_CY - CLIP_W/2, 0]) rotate([90,0,0]) translate([0,0,-CLIP_W]) linear_extrude(CLIP_W)
        polygon([[CLIP_INX - CLIP_IN*HOST_T/2, LID_TOP_Z - 0.8],         // anchor low, into the wall (fuse)
                 [CLIP_INX + CLIP_IN*CLIP_LIP, LID_TOP_Z],               // lip tip: overhang over the lid top
                 [CLIP_INX + CLIP_IN*CLIP_LIP, LID_TOP_Z + 0.4],         // lip front
                 [CLIP_INX - CLIP_IN*HOST_T/2, LID_TOP_Z + CLIP_RAMP_H]]);// lead-in ramp up into the wall
}

// --- finger scallop (CUT): a semicircular dish in the rim's INNER edge at the clip, so a
//     fingertip reaches under the lid edge to release it. Interior half only (does not
//     touch the wall body or the clip's anchor).
module lid_scallop() {
    intersection() {
        translate([CLIP_INX, CLIP_CY, BODY_H - SCALLOP_DEPTH]) cylinder(h = SCALLOP_DEPTH + EPS, r = SCALLOP_W/2, $fn = 40);
        translate([CLIP_INX + (CLIP_IN<0 ? -SCALLOP_W : 0), CLIP_CY - SCALLOP_W, BODY_H - SCALLOP_DEPTH - EPS])
            cube([SCALLOP_W, 2*SCALLOP_W, SCALLOP_DEPTH + 2*EPS]);
    }
}

// ============================================================================
// The six pieces.  piece = intersection(box, cell + own male keys) - own sockets
//   A halves are MALE on the A/B seam (keep the key); B halves are FEMALE (slot).
//   On a chamber seam the LEFT chamber is male (+Y), the right chamber is female.
// ============================================================================
// Base half-lap shingling (FEMALE-first, Option 1):
//   A/B seam  -> the B half owns the bottom shelf (grows -X), A has the negative.
//   chamber   -> the UPPER chamber (fork, spoon) owns the shelf (grows -Y); the
//                lower chamber (knife, fork) has the negative.
//   Assembly order: spoon, fork, knife; B before A (male lowered onto female).
// Center crossings (104,81)&(104,186): the CHAMBER shelf (fork_A / spoon_A) owns the
//   crossing square; the B-half A/B shelf (knife_B / fork_B) is CLIPPED short of the
//   chamber seam by LAP_LEN so two shelves never collide.
module knife_A() {                                       // placed LAST; receives everything
    difference() {
        union() {
            intersection() {
                box();
                union() {
                    cell(-1, AB_SEAM, KNIFE_Y0 - 1, KNIFE_Y1);
                    ab_key(YC_OUTL); ab_key(YC_DIVKF); ch_key(SEAM_KF, ENDC_A);
                    ab_cap(YC_OUTL); div_cap(YC_DIVKF); ch_cap(SEAM_KF, ENDC_A);  // hide tops (divider uses LOWERED hat)
                }
            }
            intersection() { lid_ledge(); cell(-1, AB_SEAM, KNIFE_Y0 - 1, KNIFE_Y1); }  // lid support ledge
        }
        lap_neg_X(KNIFE_Y0, KNIFE_Y1);            // receive knife_B's A/B shelf
        lap_neg_Y(SEAM_KF, 0, AB_SEAM);           // receive fork_A's chamber shelf
        hinge_groove(); divider_lower(); lid_scallop();   // lid cuts (groove hits A pieces; divider/scallop where present)
    }
}

module knife_B() {
    difference() {
        union() {
            intersection() {
                box();
                union() {
                    cell(AB_SEAM, TOTAL_LEN + 1, KNIFE_Y0 - 1, KNIFE_Y1);
                    ch_key(SEAM_KF, ENDC_B);
                    ch_cap(SEAM_KF, ENDC_B);                // hide top (male, chamber)
                }
            }
            lap_shelf_X(KNIFE_Y0, KNIFE_Y1 - LAP_LEN);  // A/B shelf -> knife_A (CLIPPED at y=81 crossing)
            intersection() { lid_ledge(); cell(AB_SEAM, TOTAL_LEN + 1, KNIFE_Y0 - 1, KNIFE_Y1); }  // lid support ledge
        }
        ab_socket(YC_OUTL); ab_socket(YC_DIVKF);
        ab_cap_neg(YC_OUTL); div_cap_neg(YC_DIVKF);      // top recesses to receive knife_A's caps (divider = LOWERED hat)
        lap_neg_Y(SEAM_KF, AB_SEAM, TOTAL_LEN);         // receive fork_B's chamber shelf
        hinge_groove(); divider_lower(); lid_scallop();   // lid cuts
    }
}

module fork_A() {
    difference() {
        union() {
            intersection() {
                box();
                union() {
                    cell(-1, AB_SEAM, FORK_Y0 + SEAM_EPS, FORK_Y1);  // -Y cut nudged off the divider face
                    ab_key(YC_DIVFS); ch_key(SEAM_FS, ENDC_A);
                    div_cap(YC_DIVFS); ch_cap(SEAM_FS, ENDC_A);       // hide tops (divider uses LOWERED hat)
                }
            }
            lap_shelf_Y(SEAM_KF, 0, AB_SEAM);           // chamber shelf -> knife_A (owns crossing)
            intersection() { lid_ledge(); cell(-1, AB_SEAM, FORK_Y0 + SEAM_EPS, FORK_Y1); }  // lid support ledge (none in fork-A)
        }
        lap_neg_X(FORK_Y0, FORK_Y1);                    // receive fork_B's A/B shelf
        ch_socket(SEAM_KF, ENDC_A);
        ch_cap_neg(SEAM_KF, ENDC_A);                    // top recess to receive knife_A's chamber cap (female)
        lap_neg_Y(SEAM_FS, 0, AB_SEAM, LAP_LEN_FS);     // receive spoon_A's (small) chamber shelf
        hinge_groove(); divider_lower(); lid_scallop();   // lid cuts (groove = fork-A hinge segment; divider = DIV_FS)
    }
}

module fork_B() {
    union() {
        difference() {
            union() {
                intersection() {
                    box();
                    union() {
                        cell(AB_SEAM, TOTAL_LEN + 1, FORK_Y0 + SEAM_EPS, FORK_Y1);  // -Y cut nudged off the divider face
                        ch_key(SEAM_FS, ENDC_B);
                        ch_cap(SEAM_FS, ENDC_B);                // hide top (male, chamber)
                    }
                }
                lap_shelf_X(FORK_Y0, FORK_Y1 - LAP_LEN_FS); // A/B shelf -> fork_A (CLIPPED at y=186 crossing)
                lap_shelf_Y(SEAM_KF, AB_SEAM, TOTAL_LEN);   // chamber shelf -> knife_B
                intersection() { lid_ledge(); cell(AB_SEAM, TOTAL_LEN + 1, FORK_Y0 + SEAM_EPS, FORK_Y1); }  // lid ledge (clip-end run)
            }
            ab_socket(YC_DIVFS);
            div_cap_neg(YC_DIVFS);                           // top recess to receive fork_A's A/B cap (divider = LOWERED hat)
            ch_socket(SEAM_KF, ENDC_B);
            ch_cap_neg(SEAM_KF, ENDC_B);                    // top recess to receive knife_B's chamber cap (female)
            lap_neg_Y(SEAM_FS, AB_SEAM, TOTAL_LEN, LAP_LEN_FS); // receive spoon_B's (small) chamber shelf
            hinge_groove(); divider_lower(); lid_scallop();     // lid cuts (scallop lands here)
        }
        intersection() { lid_clip(); cell(AB_SEAM, TOTAL_LEN + 1, FORK_Y0 + SEAM_EPS, FORK_Y1); }  // retaining clip, added AFTER the scallop cut
    }
}

module spoon_A() {
    difference() {
        union() {
            intersection() {
                box();
                union() {
                    cell(-1, AB_SEAM, SPOON_Y0 + SEAM_EPS, SPOON_Y1 + 1);  // -Y cut nudged off the divider face
                    ab_key(YC_OUTR);
                    ab_cap(YC_OUTR);                        // hide top (male)
                }
            }
            lap_shelf_Y(SEAM_FS, 0, AB_SEAM, LAP_LEN_FS); // chamber shelf -> fork_A (small; owns crossing)
            intersection() { lid_ledge(); cell(-1, AB_SEAM, SPOON_Y0 + SEAM_EPS, SPOON_Y1 + 1); }  // lid support ledge (OUTER_R run)
        }
        lap_neg_X(SPOON_Y0, SPOON_Y1);                  // receive spoon_B's A/B shelf
        ch_socket(SEAM_FS, ENDC_A);
        ch_cap_neg(SEAM_FS, ENDC_A);                    // top recess to receive fork_A's chamber cap (female)
        hinge_groove(); divider_lower(); lid_scallop();   // lid cuts (groove = spoon-A hinge segment)
    }
}

module spoon_B() {                                      // placed FIRST; owns shelves
    difference() {
        union() {
            intersection() {
                box();
                union() {
                    cell(AB_SEAM, TOTAL_LEN + 1, SPOON_Y0 + SEAM_EPS, SPOON_Y1 + 1);  // -Y cut nudged off the divider face
                }
            }
            lap_shelf_X(SPOON_Y0, SPOON_Y1);            // A/B shelf -> spoon_A
            lap_shelf_Y(SEAM_FS, AB_SEAM, TOTAL_LEN, LAP_LEN_FS); // chamber shelf -> fork_B (small)
            intersection() { lid_ledge(); cell(AB_SEAM, TOTAL_LEN + 1, SPOON_Y0 + SEAM_EPS, SPOON_Y1 + 1); }  // lid ledge (OUTER_R + clip-end runs)
        }
        ab_socket(YC_OUTR);
        ab_cap_neg(YC_OUTR);                            // top recess to receive spoon_A's A/B cap (female)
        ch_socket(SEAM_FS, ENDC_B);
        ch_cap_neg(SEAM_FS, ENDC_B);                    // top recess to receive fork_B's chamber cap (female)
        hinge_groove(); divider_lower(); lid_scallop();   // lid cuts
    }
}

// TRUE assembled view: the six real, separable pieces in their assembled positions
// (slower to render — many booleans — but this is what actually shows the seams, the
// lowered dividers, the hinge journal, the clip, the scallop, and all the joints).
// For a fast no-cuts preview of just the outer shell, temporarily use box(); instead.
module assembly() {
    knife_A(); knife_B(); fork_A(); fork_B(); spoon_A(); spoon_B();
}

// ============================================================================
// Render dispatch
// ============================================================================
if      (part == "knife_A")  knife_A();
else if (part == "knife_B")  knife_B();
else if (part == "fork_A")   fork_A();
else if (part == "fork_B")   fork_B();
else if (part == "spoon_A")  spoon_A();
else if (part == "spoon_B")  spoon_B();
else if (part == "assembly") assembly();
else echo(str("Unknown part: ", part));
